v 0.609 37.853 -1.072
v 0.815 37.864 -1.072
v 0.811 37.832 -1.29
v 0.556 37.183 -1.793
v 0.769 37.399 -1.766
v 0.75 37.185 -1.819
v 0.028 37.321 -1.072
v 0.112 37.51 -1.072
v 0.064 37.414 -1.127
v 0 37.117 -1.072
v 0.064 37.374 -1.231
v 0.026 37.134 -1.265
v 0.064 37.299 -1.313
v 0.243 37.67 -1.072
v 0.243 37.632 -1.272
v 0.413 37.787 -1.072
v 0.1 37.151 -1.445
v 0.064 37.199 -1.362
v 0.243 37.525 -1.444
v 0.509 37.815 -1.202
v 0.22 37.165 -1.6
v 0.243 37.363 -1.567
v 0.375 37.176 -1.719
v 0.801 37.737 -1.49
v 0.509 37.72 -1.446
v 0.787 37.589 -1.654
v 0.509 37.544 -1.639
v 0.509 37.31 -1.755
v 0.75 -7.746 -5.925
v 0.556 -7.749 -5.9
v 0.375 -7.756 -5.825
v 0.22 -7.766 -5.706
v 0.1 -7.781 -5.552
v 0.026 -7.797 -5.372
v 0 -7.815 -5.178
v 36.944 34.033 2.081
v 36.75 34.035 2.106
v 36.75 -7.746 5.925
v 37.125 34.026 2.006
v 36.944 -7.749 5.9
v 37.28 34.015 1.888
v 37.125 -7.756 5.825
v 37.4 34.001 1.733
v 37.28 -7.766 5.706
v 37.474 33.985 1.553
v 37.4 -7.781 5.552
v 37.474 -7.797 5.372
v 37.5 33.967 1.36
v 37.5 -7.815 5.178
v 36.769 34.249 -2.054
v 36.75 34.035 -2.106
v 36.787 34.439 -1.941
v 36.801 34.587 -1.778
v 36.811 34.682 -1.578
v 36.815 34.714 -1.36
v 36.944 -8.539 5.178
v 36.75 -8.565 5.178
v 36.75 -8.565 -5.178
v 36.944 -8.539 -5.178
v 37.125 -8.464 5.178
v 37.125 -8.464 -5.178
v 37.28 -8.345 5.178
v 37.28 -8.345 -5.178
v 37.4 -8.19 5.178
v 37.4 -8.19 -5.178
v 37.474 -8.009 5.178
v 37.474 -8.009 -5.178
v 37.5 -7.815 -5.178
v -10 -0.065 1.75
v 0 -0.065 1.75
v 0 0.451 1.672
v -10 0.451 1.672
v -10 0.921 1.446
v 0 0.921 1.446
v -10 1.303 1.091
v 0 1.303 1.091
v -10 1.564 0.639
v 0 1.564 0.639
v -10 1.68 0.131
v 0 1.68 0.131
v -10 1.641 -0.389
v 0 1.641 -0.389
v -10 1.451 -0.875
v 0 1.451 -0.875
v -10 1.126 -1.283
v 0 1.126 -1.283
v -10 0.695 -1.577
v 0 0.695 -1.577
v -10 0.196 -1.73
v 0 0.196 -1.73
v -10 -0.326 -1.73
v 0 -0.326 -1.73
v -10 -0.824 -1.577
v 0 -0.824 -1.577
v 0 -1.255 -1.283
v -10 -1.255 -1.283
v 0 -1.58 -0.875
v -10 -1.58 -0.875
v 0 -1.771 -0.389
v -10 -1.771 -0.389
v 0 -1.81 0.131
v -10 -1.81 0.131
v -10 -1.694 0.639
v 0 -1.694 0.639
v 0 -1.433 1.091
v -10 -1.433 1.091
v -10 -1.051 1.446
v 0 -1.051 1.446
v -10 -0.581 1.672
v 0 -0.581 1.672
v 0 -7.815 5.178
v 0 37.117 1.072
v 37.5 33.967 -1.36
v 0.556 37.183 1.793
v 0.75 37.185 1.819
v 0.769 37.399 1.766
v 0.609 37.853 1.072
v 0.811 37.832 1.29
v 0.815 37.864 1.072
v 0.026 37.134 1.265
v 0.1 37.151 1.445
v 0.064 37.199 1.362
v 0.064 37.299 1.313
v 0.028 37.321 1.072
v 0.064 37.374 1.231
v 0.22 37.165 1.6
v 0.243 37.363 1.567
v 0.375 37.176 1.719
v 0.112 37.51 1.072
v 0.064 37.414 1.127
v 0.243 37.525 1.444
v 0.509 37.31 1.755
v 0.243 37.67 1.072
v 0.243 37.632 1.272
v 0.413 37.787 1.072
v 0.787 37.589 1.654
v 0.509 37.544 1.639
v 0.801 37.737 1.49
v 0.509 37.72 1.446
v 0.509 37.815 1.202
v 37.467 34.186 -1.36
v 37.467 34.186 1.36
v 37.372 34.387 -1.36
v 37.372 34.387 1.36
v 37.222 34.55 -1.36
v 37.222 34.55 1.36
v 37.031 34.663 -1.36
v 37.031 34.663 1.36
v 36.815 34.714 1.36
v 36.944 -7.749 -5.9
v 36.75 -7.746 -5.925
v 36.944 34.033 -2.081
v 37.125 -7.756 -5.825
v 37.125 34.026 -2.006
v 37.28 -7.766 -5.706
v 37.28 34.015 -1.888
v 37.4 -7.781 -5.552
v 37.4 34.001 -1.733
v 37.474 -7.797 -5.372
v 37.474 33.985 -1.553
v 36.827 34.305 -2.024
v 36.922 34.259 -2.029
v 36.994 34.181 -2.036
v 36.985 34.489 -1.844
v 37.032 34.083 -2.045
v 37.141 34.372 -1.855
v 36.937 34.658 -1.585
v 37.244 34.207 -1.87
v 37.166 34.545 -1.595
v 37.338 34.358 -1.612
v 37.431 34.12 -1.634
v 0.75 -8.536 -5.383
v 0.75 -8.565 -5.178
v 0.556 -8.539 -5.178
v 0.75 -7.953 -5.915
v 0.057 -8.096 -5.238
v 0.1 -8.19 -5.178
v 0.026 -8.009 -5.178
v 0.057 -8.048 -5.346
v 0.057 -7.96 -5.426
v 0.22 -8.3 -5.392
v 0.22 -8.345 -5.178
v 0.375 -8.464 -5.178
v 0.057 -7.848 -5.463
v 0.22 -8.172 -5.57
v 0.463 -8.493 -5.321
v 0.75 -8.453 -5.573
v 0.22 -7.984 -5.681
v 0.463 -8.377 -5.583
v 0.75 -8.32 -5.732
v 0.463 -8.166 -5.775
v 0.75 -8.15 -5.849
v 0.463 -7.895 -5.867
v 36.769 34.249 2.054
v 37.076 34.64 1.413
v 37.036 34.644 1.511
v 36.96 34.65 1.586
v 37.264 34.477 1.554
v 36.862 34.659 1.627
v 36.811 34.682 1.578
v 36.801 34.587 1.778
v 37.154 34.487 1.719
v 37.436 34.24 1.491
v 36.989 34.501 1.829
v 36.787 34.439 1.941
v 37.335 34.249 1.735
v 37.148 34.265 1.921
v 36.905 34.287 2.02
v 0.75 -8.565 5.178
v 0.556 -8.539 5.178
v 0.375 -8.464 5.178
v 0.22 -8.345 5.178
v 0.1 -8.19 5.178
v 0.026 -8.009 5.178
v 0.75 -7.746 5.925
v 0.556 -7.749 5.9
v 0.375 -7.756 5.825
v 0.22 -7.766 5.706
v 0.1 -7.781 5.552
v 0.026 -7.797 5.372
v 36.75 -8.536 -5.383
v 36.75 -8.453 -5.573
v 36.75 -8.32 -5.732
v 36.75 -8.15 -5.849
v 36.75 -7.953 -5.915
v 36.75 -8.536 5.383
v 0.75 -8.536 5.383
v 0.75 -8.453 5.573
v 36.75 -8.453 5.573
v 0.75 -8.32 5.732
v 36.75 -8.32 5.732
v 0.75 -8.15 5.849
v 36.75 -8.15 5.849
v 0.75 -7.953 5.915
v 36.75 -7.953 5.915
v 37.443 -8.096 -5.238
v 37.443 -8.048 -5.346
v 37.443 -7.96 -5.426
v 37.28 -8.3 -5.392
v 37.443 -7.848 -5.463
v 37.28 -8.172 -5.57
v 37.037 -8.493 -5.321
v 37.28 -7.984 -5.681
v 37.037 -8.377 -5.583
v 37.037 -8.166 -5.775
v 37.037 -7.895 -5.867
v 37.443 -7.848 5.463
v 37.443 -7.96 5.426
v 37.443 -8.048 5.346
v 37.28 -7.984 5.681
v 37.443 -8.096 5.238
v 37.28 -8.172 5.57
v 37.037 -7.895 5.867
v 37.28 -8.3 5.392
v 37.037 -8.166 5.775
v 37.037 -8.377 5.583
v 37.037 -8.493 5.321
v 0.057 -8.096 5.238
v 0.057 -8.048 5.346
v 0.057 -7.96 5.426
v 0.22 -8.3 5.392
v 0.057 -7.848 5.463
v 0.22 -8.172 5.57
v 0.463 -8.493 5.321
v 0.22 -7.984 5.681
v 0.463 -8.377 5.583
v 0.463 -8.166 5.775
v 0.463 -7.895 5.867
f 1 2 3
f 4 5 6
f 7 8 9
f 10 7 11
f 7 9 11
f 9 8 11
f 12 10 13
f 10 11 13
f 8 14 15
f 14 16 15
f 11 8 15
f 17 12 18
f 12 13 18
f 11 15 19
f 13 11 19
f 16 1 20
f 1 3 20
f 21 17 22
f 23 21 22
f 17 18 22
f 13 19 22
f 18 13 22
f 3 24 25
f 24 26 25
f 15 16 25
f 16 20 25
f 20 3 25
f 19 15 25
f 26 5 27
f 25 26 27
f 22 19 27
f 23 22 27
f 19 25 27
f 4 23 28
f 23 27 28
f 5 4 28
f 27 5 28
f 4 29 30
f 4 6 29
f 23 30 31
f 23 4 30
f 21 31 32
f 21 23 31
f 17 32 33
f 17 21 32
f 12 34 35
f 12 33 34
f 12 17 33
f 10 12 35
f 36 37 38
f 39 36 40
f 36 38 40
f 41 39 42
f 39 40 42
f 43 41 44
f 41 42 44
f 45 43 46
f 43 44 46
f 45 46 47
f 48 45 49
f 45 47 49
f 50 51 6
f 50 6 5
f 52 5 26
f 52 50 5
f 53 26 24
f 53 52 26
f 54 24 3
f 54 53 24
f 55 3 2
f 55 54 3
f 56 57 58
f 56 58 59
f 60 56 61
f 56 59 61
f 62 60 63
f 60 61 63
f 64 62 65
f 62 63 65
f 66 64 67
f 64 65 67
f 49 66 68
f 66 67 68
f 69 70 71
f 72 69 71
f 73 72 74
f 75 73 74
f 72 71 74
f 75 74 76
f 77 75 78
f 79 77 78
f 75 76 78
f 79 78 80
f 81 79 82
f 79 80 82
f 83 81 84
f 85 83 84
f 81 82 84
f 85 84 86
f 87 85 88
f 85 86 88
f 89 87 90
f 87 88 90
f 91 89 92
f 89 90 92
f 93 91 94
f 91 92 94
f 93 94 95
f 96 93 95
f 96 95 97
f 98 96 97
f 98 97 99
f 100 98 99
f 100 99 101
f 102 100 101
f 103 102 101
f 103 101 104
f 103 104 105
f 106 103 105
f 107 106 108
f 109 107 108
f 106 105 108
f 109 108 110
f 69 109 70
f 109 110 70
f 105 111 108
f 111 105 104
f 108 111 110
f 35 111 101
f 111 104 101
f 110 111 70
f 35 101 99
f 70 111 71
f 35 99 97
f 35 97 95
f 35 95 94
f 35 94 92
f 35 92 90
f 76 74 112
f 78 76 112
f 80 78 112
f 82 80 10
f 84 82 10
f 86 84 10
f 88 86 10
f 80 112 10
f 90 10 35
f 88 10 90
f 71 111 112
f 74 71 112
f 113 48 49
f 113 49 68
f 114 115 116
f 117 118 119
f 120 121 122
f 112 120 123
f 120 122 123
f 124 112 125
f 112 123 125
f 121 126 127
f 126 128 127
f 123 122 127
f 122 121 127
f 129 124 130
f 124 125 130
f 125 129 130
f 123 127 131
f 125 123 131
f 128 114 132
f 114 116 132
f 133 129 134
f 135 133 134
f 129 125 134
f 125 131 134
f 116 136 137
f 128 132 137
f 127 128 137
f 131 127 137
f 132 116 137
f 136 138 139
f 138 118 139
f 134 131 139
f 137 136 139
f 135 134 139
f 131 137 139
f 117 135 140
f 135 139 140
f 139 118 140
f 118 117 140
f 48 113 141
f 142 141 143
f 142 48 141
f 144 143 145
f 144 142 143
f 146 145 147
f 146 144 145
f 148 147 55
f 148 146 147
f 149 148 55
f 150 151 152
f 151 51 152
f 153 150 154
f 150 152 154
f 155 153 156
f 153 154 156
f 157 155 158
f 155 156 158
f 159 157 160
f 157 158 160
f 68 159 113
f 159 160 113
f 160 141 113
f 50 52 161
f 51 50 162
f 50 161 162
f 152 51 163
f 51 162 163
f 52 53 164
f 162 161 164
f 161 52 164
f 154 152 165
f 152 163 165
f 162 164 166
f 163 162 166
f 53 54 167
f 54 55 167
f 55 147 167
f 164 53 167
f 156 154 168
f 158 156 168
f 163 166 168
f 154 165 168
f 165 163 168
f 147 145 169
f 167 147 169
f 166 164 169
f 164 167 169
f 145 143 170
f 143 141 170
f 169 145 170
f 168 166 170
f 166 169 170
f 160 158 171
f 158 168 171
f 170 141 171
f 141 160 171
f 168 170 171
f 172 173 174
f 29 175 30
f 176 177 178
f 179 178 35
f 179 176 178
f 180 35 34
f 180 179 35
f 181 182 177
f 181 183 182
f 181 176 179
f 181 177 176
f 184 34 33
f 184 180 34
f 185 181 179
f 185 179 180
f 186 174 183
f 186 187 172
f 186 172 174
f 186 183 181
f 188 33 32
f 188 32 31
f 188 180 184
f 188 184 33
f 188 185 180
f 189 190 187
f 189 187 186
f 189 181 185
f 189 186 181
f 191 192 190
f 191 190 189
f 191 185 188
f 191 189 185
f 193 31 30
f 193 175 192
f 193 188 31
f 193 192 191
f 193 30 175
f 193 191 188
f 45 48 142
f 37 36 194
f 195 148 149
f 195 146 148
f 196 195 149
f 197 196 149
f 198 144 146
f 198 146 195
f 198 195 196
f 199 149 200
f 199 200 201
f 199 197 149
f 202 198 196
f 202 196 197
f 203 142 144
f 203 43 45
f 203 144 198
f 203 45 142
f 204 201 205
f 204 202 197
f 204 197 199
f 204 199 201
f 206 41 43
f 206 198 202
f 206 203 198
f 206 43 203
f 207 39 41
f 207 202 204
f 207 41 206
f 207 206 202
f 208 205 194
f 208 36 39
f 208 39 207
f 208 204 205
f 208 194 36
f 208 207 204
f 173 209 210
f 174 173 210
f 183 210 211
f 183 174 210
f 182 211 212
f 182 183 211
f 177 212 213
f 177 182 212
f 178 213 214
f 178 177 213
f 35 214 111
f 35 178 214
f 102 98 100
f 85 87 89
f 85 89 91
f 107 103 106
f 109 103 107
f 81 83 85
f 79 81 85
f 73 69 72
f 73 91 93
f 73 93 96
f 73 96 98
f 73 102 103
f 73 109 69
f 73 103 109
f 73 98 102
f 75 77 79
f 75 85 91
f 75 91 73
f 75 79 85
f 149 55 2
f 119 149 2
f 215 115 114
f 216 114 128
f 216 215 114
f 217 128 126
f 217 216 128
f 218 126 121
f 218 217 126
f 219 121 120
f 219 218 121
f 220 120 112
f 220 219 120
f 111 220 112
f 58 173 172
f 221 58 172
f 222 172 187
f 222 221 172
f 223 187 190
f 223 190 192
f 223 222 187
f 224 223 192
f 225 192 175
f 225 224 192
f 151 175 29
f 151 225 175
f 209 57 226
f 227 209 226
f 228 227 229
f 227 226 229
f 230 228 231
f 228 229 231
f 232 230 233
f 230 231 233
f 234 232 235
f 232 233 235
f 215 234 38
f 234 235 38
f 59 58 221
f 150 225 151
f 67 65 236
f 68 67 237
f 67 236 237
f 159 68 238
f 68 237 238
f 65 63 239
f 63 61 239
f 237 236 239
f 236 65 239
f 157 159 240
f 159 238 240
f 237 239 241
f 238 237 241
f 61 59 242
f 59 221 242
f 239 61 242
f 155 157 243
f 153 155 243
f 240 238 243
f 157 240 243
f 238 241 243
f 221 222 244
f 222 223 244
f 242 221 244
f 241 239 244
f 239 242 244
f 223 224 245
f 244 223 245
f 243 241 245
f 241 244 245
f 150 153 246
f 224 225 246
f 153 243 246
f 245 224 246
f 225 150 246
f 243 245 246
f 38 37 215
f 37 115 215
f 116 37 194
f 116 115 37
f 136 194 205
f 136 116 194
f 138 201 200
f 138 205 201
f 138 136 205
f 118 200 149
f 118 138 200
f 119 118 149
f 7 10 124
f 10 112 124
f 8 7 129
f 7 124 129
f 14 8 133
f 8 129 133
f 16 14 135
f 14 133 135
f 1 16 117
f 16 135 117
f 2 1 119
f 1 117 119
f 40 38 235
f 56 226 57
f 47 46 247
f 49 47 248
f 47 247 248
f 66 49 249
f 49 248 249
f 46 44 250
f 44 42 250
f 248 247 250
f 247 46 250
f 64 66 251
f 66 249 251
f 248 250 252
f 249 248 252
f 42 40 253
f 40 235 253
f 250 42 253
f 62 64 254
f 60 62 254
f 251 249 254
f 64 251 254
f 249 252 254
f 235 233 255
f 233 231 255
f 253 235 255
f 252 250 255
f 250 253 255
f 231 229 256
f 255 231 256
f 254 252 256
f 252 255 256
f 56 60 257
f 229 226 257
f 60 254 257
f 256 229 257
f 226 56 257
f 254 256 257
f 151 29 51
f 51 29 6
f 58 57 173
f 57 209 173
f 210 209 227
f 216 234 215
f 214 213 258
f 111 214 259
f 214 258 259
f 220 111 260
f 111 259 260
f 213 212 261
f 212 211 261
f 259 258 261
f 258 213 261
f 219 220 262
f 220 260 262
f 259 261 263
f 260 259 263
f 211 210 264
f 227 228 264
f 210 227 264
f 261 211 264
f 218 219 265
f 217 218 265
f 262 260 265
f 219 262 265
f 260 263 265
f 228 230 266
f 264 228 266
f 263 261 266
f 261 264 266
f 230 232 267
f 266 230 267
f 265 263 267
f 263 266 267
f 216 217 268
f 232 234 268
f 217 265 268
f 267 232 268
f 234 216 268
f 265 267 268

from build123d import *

# Parameters (mm, degrees)
SALIENTE_EXTRUIR1_DEPTH    = 37.5
CORTAR_EXTRUIR1_DEPTH      = 37.5
CORTAR_EXTRUIR1_DEPTH_BACK = 37.5
CROQUIS3_R                 = 1.75
SALIENTE_EXTRUIR2_DEPTH    = 10
REDONDEO1_R                = 0.75


with BuildPart() as part:
    # Croquis1 → Saliente-Extruir1 (new body)
    with BuildSketch(Plane(origin=(0, 0, 0), x_dir=(0, 0, -1), z_dir=(1, 0, 0))):
        Polygon((-6, -8.564759036), (6, -8.564759036), (1.75, 37.935240964), (-1.75, 37.935240964), align=None)
    extrude(amount=SALIENTE_EXTRUIR1_DEPTH)

    # Croquis2 → Cortar-Extruir1 (cut, two sides: drawn at the far end of the back side and taken through both)
    with BuildSketch(Plane.XY.offset(-CORTAR_EXTRUIR1_DEPTH_BACK)):
        Polygon((0, 37.935240964), (37.5, 37.935240964), (37.5, 34.654416082), align=None)
    extrude(amount=CORTAR_EXTRUIR1_DEPTH + CORTAR_EXTRUIR1_DEPTH_BACK, mode=Mode.SUBTRACT)

    # Croquis3 → Saliente-Extruir2 (add)
    with BuildSketch(Plane.ZY):
        with Locations((0, -0.064759036)):
            Circle(CROQUIS3_R)
    extrude(amount=SALIENTE_EXTRUIR2_DEPTH)

    # Redondeo1
    redondeo1_edges = [part.edges().sort_by_distance(p)[0] for p in [
        (37.5, 13.044828523, 4.024930169),
        (37.5, 34.654416082, 0),
        (37.5, -8.564759036, 0),
        (18.75, 36.294828523, -1.899930169),
        (18.75, 36.294828523, 1.899930169),
        (37.5, 13.044828523, -4.024930169),
        (0, -8.564759036, 0),
        (0, 14.685240964, 3.875),
        (0, 37.935240964, 0),
        (0, 14.685240964, -3.875),
        (18.75, -8.564759036, -6),
        (18.75, -8.564759036, 6),
    ]]
    fillet(redondeo1_edges, radius=REDONDEO1_R)


solid = part.part
